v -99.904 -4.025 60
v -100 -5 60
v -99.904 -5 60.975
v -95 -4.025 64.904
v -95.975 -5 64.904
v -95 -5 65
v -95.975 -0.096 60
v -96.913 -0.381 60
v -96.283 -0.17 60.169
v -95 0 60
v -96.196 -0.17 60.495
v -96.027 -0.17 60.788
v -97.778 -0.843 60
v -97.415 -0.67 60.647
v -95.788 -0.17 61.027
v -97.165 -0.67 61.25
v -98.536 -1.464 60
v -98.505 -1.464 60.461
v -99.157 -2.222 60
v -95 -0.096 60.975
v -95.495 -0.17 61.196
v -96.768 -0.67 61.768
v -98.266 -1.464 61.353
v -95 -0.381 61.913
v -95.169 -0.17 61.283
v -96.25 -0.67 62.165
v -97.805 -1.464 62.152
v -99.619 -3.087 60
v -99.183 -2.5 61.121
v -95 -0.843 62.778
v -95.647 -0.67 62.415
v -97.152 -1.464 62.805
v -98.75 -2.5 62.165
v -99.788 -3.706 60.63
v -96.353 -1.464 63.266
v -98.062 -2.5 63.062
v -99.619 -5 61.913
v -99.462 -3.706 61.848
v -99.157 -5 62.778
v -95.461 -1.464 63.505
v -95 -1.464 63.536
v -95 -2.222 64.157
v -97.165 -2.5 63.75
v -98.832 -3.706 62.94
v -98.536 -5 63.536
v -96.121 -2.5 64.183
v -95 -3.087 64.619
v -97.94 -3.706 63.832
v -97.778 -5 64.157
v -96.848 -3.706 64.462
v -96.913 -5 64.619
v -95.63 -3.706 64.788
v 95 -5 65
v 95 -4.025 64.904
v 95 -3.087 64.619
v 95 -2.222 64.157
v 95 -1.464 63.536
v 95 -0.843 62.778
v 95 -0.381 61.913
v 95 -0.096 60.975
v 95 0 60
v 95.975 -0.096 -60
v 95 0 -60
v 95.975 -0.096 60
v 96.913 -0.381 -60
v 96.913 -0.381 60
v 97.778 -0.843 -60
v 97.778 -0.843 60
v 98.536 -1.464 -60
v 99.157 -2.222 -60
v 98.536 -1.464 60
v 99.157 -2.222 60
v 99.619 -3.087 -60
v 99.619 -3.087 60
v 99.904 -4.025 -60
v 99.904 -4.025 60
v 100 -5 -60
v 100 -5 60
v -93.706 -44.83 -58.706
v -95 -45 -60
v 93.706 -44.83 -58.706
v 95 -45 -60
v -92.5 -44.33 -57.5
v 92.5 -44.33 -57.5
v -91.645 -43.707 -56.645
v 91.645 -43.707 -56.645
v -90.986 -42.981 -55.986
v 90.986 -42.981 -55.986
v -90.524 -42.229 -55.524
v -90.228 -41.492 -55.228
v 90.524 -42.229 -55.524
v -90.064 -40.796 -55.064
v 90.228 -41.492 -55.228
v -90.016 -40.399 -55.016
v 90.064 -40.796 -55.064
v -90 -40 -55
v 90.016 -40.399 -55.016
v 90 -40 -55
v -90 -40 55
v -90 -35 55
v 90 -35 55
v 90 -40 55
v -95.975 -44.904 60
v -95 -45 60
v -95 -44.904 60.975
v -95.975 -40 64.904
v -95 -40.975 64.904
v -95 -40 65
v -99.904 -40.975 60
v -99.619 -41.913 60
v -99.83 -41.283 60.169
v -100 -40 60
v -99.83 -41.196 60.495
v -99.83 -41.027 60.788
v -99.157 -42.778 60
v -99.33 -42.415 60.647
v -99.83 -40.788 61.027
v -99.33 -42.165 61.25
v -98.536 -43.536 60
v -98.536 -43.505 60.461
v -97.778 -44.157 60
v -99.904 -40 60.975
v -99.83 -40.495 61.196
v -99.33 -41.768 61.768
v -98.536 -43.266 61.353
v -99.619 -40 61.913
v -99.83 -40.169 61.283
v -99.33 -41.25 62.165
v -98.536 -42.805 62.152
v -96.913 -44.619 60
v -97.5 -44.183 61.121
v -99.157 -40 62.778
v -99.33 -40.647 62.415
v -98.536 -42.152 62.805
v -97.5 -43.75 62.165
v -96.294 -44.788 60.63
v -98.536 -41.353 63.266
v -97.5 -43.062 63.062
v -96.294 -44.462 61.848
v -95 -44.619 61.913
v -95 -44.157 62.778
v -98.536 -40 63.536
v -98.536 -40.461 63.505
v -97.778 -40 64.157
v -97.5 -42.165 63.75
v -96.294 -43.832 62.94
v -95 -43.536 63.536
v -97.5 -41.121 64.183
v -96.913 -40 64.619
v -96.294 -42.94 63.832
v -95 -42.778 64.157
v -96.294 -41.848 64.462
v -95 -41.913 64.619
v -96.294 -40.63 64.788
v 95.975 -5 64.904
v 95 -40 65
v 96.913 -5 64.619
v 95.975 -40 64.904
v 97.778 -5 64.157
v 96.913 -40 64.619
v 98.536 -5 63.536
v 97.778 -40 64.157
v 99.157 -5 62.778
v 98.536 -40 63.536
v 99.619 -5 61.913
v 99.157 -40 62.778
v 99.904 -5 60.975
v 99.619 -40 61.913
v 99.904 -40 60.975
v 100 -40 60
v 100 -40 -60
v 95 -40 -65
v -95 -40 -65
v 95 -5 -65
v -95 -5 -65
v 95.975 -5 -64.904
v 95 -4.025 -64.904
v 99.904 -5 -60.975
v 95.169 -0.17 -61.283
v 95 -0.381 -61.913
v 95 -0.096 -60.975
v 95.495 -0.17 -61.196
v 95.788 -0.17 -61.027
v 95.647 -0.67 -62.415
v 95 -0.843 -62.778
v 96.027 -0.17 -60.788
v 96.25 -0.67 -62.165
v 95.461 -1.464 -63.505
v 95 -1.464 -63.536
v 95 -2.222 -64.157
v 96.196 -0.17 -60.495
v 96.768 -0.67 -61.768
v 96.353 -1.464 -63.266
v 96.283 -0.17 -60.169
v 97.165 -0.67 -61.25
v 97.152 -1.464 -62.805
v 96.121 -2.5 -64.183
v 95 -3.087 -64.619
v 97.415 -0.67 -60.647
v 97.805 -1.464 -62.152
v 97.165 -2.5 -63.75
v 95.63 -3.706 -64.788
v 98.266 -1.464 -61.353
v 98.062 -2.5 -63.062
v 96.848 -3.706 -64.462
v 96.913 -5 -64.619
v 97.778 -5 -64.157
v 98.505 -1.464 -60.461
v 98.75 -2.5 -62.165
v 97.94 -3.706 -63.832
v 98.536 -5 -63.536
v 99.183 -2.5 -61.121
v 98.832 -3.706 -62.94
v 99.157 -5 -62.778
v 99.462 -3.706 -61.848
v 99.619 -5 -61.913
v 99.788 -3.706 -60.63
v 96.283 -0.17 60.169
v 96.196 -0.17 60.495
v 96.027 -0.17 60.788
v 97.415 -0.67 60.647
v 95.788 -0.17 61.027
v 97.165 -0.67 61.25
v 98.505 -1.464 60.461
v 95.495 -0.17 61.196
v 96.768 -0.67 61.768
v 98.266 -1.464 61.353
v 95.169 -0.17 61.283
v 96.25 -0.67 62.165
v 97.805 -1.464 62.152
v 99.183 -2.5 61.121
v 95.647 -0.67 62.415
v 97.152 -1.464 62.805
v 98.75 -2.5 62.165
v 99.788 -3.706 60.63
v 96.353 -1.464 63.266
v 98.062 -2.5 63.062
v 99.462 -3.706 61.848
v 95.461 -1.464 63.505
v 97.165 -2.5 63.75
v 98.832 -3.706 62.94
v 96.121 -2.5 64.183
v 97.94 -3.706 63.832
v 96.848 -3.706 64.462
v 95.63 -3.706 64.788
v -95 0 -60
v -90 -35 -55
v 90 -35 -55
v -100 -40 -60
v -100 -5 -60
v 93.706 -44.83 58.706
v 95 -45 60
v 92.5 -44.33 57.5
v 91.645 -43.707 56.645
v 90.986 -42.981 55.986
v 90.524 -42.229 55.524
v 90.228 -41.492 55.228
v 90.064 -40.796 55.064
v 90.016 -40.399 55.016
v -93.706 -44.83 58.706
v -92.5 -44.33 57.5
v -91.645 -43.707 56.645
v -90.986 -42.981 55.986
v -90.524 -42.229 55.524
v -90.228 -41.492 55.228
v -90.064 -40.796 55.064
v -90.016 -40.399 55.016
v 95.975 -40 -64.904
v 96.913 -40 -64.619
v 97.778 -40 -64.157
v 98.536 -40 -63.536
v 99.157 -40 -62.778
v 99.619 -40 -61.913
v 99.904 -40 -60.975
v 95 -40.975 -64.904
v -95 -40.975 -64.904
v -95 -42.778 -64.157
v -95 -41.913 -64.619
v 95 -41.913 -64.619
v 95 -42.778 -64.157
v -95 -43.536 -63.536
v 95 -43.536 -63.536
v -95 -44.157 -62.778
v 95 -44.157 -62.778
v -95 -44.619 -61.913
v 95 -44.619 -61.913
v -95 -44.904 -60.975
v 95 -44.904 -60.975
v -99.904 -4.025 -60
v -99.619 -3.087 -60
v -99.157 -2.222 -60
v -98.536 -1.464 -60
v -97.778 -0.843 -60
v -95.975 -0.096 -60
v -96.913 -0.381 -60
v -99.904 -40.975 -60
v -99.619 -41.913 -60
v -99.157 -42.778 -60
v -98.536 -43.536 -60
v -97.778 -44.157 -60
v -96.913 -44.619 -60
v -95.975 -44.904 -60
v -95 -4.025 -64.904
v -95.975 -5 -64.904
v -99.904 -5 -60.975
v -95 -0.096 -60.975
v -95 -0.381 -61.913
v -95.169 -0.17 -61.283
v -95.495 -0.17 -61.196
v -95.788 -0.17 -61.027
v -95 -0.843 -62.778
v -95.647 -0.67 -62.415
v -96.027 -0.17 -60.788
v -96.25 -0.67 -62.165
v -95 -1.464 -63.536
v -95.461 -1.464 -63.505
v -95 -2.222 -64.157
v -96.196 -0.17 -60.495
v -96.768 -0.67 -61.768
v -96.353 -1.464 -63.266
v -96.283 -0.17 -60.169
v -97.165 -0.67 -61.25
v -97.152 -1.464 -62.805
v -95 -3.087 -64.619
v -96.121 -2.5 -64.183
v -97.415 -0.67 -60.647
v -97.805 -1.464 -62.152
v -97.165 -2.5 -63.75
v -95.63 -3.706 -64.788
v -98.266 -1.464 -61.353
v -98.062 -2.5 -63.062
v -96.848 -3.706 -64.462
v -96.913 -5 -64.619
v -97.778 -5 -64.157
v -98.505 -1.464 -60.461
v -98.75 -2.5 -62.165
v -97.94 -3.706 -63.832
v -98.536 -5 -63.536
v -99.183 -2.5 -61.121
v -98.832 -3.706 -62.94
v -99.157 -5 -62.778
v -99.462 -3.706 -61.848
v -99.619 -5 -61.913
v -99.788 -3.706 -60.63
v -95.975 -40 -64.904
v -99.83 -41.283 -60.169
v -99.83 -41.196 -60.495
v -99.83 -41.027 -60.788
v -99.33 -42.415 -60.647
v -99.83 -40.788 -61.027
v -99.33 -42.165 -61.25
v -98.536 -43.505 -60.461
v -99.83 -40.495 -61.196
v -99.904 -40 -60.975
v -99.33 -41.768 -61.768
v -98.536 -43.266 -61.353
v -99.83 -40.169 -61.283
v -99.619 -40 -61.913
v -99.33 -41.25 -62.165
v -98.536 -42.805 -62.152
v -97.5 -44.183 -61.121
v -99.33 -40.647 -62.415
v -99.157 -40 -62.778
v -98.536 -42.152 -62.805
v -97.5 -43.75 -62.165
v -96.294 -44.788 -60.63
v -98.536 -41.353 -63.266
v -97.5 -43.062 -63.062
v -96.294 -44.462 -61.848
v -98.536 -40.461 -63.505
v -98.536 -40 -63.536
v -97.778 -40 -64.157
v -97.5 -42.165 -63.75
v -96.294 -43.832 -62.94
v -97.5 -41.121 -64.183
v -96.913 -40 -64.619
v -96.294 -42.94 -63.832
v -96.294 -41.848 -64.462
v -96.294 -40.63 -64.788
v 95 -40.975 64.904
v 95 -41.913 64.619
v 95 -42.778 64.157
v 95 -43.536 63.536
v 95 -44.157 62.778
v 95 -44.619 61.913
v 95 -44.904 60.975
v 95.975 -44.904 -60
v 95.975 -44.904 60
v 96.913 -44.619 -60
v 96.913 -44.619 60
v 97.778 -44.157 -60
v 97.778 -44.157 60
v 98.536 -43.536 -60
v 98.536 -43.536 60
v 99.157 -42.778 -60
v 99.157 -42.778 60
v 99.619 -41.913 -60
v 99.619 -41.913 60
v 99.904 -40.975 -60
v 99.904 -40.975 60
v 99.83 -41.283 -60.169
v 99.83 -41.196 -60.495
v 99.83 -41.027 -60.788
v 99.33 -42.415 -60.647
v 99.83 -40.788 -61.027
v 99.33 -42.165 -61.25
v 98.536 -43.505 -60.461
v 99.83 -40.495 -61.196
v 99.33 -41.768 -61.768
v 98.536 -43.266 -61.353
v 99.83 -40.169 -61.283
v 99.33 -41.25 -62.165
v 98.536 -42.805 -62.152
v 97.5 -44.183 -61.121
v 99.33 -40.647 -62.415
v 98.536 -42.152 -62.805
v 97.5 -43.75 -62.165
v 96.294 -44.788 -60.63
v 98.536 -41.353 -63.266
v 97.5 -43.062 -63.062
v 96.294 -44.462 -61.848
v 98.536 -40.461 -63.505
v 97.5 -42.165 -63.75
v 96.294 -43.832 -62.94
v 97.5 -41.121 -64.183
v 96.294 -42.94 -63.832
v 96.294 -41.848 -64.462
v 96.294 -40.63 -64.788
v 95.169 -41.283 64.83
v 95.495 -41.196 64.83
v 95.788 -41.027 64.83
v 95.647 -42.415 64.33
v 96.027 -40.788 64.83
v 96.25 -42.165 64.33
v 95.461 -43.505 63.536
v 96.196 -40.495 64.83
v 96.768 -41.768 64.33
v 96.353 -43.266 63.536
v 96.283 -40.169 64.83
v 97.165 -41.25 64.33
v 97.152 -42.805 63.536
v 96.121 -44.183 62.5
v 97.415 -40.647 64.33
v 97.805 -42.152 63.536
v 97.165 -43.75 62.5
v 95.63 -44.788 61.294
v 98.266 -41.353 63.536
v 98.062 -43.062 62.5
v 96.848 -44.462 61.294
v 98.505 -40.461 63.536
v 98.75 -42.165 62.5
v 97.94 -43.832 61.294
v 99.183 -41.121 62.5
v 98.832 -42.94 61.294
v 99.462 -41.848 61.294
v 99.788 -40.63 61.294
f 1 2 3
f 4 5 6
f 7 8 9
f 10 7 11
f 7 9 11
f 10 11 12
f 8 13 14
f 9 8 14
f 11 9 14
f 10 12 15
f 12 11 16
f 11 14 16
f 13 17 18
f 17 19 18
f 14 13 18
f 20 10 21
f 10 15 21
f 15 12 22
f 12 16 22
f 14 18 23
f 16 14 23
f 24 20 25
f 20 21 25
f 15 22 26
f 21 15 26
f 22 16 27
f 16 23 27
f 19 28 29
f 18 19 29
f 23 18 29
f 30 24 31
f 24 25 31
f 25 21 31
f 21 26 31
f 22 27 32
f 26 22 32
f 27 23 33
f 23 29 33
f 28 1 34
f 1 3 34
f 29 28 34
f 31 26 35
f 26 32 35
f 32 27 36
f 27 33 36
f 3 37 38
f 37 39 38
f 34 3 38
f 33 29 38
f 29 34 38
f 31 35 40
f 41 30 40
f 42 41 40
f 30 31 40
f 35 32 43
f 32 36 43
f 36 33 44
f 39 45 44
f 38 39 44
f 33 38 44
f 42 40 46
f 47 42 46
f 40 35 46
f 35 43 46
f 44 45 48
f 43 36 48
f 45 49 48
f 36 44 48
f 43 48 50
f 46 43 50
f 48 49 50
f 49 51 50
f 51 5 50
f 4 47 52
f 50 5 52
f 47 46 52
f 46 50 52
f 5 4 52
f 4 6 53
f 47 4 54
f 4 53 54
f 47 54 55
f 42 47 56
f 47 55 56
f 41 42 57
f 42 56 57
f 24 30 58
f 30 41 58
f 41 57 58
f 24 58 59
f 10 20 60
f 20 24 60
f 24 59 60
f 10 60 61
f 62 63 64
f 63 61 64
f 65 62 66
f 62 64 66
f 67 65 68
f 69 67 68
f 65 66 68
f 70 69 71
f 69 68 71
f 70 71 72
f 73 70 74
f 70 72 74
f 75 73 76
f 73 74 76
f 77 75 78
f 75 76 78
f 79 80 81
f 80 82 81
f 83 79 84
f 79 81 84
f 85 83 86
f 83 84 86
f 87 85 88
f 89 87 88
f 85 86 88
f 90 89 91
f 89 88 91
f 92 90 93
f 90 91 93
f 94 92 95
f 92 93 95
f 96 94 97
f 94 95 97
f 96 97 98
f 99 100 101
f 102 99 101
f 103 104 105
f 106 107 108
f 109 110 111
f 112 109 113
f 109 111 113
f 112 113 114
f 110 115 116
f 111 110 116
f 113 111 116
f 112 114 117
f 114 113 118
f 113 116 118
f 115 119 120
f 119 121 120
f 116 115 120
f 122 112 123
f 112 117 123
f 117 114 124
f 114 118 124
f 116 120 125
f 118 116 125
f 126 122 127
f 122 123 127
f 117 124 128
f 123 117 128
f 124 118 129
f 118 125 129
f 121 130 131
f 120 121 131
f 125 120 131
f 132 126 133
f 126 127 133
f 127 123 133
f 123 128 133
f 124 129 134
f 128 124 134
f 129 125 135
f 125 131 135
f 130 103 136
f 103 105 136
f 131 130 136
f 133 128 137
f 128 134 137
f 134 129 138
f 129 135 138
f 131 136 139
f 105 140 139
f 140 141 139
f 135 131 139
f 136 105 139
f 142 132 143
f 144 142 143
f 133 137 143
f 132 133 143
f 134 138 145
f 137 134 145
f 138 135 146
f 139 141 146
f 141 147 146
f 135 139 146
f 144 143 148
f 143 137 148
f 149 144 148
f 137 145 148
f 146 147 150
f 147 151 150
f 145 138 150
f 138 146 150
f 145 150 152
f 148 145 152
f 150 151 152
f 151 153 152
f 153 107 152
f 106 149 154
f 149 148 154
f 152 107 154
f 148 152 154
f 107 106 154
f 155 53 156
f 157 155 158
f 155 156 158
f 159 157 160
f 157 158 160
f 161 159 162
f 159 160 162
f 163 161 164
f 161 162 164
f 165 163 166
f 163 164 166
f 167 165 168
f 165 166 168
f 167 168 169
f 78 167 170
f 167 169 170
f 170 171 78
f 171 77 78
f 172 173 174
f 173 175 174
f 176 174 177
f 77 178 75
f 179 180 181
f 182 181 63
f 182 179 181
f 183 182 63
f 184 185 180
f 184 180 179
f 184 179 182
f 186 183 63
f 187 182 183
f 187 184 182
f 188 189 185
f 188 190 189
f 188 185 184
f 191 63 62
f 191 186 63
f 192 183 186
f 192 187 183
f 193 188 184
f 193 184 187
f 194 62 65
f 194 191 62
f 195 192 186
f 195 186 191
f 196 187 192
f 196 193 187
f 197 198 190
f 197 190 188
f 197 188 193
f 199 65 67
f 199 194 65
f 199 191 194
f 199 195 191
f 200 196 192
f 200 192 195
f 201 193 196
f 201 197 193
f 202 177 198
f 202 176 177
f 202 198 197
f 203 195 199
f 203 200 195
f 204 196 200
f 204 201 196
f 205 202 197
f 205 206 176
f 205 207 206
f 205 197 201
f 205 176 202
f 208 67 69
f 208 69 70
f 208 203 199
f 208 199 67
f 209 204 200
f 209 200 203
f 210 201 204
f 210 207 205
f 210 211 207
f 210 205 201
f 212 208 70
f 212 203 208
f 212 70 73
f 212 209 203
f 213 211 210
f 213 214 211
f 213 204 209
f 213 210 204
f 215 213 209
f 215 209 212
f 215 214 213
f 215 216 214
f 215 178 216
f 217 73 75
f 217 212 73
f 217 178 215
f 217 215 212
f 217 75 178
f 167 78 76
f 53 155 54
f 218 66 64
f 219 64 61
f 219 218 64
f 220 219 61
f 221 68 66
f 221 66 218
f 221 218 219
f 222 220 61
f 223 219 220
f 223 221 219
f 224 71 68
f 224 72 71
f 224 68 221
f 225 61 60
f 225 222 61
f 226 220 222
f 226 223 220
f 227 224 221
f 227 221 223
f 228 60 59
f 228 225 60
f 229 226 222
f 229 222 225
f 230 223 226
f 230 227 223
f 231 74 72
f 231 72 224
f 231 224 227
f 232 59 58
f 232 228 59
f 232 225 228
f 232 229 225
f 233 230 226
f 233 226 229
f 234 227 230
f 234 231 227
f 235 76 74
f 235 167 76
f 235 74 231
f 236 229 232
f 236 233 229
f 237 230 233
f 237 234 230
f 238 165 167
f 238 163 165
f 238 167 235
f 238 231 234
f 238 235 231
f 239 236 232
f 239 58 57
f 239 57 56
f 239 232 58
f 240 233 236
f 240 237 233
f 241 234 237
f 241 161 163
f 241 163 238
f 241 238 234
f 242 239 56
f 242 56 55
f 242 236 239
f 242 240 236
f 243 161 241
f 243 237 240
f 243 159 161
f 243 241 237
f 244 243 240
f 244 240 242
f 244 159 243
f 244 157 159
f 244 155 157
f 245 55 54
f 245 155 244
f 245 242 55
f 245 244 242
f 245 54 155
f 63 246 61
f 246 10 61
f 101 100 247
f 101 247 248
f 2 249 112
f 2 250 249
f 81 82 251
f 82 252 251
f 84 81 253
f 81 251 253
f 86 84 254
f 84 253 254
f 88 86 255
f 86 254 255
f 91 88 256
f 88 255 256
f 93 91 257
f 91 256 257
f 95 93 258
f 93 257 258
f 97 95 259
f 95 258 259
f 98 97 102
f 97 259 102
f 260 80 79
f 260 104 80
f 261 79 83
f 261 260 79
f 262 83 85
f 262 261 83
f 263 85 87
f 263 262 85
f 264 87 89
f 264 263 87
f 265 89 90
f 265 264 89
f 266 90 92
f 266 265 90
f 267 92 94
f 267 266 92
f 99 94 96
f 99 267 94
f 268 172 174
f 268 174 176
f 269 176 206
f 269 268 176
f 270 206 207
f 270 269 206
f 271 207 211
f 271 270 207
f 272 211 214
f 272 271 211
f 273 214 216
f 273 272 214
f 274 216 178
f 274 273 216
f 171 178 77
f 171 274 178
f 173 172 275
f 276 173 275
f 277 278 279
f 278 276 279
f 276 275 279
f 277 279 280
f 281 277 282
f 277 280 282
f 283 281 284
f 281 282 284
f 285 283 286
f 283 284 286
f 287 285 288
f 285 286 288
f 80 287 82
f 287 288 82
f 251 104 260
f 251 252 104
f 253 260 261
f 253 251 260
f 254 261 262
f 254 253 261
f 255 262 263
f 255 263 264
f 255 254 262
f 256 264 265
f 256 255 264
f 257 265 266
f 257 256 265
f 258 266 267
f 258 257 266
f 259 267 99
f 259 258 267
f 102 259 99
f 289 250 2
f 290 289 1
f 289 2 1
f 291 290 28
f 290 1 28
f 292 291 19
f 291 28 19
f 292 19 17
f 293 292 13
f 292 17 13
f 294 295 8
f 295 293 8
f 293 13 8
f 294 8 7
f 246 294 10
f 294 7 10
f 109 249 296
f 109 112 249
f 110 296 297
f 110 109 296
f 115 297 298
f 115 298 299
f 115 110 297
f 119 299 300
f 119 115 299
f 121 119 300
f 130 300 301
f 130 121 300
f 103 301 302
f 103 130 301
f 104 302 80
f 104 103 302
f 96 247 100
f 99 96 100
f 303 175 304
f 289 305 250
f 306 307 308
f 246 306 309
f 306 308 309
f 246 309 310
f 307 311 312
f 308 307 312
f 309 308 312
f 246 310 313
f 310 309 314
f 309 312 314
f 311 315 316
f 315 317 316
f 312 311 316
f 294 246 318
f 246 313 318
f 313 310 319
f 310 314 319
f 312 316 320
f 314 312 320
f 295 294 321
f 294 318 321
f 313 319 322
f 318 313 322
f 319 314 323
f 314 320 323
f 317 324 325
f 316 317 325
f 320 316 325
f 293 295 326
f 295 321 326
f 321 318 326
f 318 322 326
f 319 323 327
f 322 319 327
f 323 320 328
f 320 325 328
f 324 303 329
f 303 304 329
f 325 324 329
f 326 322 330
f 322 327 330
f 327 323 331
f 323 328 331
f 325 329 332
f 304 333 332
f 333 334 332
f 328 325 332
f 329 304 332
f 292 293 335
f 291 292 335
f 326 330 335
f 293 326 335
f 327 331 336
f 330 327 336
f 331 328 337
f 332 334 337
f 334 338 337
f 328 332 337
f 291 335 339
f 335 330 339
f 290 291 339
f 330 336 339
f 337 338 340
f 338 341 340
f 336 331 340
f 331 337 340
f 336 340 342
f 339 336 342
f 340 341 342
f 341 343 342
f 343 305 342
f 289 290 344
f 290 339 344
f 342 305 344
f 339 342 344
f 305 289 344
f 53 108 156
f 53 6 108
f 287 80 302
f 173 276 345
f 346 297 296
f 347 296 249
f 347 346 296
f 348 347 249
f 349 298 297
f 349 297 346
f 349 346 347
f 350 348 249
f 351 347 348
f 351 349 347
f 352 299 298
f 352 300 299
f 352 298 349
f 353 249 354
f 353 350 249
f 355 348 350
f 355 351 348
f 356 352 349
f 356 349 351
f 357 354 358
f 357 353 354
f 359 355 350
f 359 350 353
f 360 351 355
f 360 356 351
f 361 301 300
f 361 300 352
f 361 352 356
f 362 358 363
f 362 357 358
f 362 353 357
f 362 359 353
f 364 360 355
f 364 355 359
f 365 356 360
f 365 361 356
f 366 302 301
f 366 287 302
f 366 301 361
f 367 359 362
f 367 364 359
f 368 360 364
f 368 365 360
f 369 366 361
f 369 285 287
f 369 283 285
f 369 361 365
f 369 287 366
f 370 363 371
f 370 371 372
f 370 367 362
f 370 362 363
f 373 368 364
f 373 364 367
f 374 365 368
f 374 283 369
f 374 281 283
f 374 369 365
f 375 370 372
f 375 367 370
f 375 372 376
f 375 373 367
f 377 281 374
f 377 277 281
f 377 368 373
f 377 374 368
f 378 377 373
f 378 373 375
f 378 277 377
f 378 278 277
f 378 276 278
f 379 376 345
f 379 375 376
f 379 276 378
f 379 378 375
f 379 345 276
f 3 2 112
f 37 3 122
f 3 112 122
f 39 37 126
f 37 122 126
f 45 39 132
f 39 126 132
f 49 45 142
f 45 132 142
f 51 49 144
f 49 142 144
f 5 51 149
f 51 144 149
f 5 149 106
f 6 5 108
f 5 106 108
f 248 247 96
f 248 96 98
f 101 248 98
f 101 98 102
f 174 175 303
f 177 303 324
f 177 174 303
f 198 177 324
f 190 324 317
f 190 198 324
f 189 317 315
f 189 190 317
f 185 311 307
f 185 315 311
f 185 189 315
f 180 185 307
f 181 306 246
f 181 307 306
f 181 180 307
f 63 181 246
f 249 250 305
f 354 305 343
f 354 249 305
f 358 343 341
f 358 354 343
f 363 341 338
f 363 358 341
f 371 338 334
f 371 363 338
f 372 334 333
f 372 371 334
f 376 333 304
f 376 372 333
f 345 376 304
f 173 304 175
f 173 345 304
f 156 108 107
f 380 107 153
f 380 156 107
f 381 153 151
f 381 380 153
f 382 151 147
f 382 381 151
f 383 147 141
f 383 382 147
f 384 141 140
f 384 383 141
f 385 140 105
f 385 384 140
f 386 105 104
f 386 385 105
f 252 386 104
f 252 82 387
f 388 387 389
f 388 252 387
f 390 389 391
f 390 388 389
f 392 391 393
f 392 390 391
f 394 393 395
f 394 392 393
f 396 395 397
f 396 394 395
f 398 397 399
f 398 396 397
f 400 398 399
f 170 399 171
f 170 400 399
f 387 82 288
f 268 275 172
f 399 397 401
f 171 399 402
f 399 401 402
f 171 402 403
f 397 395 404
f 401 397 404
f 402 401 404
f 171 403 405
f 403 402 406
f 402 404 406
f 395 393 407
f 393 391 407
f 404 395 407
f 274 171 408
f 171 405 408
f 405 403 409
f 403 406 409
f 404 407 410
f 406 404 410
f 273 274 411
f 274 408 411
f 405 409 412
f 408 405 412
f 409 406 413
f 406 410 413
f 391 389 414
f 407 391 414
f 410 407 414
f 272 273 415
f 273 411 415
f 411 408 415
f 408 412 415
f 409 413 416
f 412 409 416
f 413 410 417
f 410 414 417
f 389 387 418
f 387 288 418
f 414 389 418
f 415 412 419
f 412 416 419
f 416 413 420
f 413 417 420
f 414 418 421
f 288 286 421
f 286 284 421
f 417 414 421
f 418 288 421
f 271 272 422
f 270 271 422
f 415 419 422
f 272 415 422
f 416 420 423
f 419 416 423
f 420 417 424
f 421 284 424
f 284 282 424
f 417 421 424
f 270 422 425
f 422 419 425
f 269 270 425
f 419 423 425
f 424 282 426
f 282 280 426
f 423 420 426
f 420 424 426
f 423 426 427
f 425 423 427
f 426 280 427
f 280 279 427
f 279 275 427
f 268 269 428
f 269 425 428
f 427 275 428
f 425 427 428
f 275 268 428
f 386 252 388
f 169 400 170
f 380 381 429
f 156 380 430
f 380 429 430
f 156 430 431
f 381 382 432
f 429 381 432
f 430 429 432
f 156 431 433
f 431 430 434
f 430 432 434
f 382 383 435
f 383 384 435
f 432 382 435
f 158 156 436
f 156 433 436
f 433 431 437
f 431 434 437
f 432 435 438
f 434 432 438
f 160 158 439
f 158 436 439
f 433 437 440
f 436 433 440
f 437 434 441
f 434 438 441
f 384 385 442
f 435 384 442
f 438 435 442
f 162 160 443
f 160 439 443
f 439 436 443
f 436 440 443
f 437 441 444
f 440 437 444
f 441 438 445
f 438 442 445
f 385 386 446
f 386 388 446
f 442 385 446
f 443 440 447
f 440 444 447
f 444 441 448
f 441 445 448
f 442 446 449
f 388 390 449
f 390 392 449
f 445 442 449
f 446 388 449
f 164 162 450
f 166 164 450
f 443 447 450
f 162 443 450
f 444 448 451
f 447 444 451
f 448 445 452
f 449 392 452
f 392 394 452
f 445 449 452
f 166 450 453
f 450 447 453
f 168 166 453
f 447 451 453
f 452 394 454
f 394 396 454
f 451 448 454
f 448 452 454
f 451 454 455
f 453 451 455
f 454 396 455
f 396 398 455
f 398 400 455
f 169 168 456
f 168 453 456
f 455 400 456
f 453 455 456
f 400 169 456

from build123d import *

# Parameters (mm, degrees)
F0_W     = 180
F0_H     = 110
F1_DEPTH = 35
F0_W_2   = 200
F0_H_2   = 130
F2_DEPTH = 45
F3_R     = 4.99999


# Not quite as in the source:
# - a fillet or chamfer is up to 0.001 mm smaller than in the source, because OpenCascade refuses the exact size


with BuildPart() as f1:
    # F0 (on Front) → F1 (new body)
    with BuildSketch(Plane.XZ):
        Rectangle(F0_W, F0_H)
    extrude(amount=F1_DEPTH)

    # F0 (on Front) → F2 (join)
    with BuildSketch(Plane.XZ):
        Rectangle(F0_W_2, F0_H_2)
        Rectangle(F0_W, F0_H, mode=Mode.SUBTRACT)
    extrude(amount=F2_DEPTH)

    # F3 (radius 5 in the source; OpenCascade refuses exactly that, so slightly less here)
    f3_edges = [f1.edges().sort_by_distance(p)[0] for p in [
        (0, -45, -65),
        (100, -45, 0),
        (0, -45, 65),
        (-100, -45, 0),
        (0, -45, 55),
        (90, -45, 0),
        (0, -45, -55),
        (-90, -45, 0),
        (-100, -22.5, -65),
        (100, -22.5, -65),
        (0, 0, -65),
        (-100, -22.5, 65),
        (-100, 0, 0),
        (100, -22.5, 65),
        (100, 0, 0),
        (0, 0, 65),
    ]]
    fillet(f3_edges, radius=F3_R)


solid = f1.part
